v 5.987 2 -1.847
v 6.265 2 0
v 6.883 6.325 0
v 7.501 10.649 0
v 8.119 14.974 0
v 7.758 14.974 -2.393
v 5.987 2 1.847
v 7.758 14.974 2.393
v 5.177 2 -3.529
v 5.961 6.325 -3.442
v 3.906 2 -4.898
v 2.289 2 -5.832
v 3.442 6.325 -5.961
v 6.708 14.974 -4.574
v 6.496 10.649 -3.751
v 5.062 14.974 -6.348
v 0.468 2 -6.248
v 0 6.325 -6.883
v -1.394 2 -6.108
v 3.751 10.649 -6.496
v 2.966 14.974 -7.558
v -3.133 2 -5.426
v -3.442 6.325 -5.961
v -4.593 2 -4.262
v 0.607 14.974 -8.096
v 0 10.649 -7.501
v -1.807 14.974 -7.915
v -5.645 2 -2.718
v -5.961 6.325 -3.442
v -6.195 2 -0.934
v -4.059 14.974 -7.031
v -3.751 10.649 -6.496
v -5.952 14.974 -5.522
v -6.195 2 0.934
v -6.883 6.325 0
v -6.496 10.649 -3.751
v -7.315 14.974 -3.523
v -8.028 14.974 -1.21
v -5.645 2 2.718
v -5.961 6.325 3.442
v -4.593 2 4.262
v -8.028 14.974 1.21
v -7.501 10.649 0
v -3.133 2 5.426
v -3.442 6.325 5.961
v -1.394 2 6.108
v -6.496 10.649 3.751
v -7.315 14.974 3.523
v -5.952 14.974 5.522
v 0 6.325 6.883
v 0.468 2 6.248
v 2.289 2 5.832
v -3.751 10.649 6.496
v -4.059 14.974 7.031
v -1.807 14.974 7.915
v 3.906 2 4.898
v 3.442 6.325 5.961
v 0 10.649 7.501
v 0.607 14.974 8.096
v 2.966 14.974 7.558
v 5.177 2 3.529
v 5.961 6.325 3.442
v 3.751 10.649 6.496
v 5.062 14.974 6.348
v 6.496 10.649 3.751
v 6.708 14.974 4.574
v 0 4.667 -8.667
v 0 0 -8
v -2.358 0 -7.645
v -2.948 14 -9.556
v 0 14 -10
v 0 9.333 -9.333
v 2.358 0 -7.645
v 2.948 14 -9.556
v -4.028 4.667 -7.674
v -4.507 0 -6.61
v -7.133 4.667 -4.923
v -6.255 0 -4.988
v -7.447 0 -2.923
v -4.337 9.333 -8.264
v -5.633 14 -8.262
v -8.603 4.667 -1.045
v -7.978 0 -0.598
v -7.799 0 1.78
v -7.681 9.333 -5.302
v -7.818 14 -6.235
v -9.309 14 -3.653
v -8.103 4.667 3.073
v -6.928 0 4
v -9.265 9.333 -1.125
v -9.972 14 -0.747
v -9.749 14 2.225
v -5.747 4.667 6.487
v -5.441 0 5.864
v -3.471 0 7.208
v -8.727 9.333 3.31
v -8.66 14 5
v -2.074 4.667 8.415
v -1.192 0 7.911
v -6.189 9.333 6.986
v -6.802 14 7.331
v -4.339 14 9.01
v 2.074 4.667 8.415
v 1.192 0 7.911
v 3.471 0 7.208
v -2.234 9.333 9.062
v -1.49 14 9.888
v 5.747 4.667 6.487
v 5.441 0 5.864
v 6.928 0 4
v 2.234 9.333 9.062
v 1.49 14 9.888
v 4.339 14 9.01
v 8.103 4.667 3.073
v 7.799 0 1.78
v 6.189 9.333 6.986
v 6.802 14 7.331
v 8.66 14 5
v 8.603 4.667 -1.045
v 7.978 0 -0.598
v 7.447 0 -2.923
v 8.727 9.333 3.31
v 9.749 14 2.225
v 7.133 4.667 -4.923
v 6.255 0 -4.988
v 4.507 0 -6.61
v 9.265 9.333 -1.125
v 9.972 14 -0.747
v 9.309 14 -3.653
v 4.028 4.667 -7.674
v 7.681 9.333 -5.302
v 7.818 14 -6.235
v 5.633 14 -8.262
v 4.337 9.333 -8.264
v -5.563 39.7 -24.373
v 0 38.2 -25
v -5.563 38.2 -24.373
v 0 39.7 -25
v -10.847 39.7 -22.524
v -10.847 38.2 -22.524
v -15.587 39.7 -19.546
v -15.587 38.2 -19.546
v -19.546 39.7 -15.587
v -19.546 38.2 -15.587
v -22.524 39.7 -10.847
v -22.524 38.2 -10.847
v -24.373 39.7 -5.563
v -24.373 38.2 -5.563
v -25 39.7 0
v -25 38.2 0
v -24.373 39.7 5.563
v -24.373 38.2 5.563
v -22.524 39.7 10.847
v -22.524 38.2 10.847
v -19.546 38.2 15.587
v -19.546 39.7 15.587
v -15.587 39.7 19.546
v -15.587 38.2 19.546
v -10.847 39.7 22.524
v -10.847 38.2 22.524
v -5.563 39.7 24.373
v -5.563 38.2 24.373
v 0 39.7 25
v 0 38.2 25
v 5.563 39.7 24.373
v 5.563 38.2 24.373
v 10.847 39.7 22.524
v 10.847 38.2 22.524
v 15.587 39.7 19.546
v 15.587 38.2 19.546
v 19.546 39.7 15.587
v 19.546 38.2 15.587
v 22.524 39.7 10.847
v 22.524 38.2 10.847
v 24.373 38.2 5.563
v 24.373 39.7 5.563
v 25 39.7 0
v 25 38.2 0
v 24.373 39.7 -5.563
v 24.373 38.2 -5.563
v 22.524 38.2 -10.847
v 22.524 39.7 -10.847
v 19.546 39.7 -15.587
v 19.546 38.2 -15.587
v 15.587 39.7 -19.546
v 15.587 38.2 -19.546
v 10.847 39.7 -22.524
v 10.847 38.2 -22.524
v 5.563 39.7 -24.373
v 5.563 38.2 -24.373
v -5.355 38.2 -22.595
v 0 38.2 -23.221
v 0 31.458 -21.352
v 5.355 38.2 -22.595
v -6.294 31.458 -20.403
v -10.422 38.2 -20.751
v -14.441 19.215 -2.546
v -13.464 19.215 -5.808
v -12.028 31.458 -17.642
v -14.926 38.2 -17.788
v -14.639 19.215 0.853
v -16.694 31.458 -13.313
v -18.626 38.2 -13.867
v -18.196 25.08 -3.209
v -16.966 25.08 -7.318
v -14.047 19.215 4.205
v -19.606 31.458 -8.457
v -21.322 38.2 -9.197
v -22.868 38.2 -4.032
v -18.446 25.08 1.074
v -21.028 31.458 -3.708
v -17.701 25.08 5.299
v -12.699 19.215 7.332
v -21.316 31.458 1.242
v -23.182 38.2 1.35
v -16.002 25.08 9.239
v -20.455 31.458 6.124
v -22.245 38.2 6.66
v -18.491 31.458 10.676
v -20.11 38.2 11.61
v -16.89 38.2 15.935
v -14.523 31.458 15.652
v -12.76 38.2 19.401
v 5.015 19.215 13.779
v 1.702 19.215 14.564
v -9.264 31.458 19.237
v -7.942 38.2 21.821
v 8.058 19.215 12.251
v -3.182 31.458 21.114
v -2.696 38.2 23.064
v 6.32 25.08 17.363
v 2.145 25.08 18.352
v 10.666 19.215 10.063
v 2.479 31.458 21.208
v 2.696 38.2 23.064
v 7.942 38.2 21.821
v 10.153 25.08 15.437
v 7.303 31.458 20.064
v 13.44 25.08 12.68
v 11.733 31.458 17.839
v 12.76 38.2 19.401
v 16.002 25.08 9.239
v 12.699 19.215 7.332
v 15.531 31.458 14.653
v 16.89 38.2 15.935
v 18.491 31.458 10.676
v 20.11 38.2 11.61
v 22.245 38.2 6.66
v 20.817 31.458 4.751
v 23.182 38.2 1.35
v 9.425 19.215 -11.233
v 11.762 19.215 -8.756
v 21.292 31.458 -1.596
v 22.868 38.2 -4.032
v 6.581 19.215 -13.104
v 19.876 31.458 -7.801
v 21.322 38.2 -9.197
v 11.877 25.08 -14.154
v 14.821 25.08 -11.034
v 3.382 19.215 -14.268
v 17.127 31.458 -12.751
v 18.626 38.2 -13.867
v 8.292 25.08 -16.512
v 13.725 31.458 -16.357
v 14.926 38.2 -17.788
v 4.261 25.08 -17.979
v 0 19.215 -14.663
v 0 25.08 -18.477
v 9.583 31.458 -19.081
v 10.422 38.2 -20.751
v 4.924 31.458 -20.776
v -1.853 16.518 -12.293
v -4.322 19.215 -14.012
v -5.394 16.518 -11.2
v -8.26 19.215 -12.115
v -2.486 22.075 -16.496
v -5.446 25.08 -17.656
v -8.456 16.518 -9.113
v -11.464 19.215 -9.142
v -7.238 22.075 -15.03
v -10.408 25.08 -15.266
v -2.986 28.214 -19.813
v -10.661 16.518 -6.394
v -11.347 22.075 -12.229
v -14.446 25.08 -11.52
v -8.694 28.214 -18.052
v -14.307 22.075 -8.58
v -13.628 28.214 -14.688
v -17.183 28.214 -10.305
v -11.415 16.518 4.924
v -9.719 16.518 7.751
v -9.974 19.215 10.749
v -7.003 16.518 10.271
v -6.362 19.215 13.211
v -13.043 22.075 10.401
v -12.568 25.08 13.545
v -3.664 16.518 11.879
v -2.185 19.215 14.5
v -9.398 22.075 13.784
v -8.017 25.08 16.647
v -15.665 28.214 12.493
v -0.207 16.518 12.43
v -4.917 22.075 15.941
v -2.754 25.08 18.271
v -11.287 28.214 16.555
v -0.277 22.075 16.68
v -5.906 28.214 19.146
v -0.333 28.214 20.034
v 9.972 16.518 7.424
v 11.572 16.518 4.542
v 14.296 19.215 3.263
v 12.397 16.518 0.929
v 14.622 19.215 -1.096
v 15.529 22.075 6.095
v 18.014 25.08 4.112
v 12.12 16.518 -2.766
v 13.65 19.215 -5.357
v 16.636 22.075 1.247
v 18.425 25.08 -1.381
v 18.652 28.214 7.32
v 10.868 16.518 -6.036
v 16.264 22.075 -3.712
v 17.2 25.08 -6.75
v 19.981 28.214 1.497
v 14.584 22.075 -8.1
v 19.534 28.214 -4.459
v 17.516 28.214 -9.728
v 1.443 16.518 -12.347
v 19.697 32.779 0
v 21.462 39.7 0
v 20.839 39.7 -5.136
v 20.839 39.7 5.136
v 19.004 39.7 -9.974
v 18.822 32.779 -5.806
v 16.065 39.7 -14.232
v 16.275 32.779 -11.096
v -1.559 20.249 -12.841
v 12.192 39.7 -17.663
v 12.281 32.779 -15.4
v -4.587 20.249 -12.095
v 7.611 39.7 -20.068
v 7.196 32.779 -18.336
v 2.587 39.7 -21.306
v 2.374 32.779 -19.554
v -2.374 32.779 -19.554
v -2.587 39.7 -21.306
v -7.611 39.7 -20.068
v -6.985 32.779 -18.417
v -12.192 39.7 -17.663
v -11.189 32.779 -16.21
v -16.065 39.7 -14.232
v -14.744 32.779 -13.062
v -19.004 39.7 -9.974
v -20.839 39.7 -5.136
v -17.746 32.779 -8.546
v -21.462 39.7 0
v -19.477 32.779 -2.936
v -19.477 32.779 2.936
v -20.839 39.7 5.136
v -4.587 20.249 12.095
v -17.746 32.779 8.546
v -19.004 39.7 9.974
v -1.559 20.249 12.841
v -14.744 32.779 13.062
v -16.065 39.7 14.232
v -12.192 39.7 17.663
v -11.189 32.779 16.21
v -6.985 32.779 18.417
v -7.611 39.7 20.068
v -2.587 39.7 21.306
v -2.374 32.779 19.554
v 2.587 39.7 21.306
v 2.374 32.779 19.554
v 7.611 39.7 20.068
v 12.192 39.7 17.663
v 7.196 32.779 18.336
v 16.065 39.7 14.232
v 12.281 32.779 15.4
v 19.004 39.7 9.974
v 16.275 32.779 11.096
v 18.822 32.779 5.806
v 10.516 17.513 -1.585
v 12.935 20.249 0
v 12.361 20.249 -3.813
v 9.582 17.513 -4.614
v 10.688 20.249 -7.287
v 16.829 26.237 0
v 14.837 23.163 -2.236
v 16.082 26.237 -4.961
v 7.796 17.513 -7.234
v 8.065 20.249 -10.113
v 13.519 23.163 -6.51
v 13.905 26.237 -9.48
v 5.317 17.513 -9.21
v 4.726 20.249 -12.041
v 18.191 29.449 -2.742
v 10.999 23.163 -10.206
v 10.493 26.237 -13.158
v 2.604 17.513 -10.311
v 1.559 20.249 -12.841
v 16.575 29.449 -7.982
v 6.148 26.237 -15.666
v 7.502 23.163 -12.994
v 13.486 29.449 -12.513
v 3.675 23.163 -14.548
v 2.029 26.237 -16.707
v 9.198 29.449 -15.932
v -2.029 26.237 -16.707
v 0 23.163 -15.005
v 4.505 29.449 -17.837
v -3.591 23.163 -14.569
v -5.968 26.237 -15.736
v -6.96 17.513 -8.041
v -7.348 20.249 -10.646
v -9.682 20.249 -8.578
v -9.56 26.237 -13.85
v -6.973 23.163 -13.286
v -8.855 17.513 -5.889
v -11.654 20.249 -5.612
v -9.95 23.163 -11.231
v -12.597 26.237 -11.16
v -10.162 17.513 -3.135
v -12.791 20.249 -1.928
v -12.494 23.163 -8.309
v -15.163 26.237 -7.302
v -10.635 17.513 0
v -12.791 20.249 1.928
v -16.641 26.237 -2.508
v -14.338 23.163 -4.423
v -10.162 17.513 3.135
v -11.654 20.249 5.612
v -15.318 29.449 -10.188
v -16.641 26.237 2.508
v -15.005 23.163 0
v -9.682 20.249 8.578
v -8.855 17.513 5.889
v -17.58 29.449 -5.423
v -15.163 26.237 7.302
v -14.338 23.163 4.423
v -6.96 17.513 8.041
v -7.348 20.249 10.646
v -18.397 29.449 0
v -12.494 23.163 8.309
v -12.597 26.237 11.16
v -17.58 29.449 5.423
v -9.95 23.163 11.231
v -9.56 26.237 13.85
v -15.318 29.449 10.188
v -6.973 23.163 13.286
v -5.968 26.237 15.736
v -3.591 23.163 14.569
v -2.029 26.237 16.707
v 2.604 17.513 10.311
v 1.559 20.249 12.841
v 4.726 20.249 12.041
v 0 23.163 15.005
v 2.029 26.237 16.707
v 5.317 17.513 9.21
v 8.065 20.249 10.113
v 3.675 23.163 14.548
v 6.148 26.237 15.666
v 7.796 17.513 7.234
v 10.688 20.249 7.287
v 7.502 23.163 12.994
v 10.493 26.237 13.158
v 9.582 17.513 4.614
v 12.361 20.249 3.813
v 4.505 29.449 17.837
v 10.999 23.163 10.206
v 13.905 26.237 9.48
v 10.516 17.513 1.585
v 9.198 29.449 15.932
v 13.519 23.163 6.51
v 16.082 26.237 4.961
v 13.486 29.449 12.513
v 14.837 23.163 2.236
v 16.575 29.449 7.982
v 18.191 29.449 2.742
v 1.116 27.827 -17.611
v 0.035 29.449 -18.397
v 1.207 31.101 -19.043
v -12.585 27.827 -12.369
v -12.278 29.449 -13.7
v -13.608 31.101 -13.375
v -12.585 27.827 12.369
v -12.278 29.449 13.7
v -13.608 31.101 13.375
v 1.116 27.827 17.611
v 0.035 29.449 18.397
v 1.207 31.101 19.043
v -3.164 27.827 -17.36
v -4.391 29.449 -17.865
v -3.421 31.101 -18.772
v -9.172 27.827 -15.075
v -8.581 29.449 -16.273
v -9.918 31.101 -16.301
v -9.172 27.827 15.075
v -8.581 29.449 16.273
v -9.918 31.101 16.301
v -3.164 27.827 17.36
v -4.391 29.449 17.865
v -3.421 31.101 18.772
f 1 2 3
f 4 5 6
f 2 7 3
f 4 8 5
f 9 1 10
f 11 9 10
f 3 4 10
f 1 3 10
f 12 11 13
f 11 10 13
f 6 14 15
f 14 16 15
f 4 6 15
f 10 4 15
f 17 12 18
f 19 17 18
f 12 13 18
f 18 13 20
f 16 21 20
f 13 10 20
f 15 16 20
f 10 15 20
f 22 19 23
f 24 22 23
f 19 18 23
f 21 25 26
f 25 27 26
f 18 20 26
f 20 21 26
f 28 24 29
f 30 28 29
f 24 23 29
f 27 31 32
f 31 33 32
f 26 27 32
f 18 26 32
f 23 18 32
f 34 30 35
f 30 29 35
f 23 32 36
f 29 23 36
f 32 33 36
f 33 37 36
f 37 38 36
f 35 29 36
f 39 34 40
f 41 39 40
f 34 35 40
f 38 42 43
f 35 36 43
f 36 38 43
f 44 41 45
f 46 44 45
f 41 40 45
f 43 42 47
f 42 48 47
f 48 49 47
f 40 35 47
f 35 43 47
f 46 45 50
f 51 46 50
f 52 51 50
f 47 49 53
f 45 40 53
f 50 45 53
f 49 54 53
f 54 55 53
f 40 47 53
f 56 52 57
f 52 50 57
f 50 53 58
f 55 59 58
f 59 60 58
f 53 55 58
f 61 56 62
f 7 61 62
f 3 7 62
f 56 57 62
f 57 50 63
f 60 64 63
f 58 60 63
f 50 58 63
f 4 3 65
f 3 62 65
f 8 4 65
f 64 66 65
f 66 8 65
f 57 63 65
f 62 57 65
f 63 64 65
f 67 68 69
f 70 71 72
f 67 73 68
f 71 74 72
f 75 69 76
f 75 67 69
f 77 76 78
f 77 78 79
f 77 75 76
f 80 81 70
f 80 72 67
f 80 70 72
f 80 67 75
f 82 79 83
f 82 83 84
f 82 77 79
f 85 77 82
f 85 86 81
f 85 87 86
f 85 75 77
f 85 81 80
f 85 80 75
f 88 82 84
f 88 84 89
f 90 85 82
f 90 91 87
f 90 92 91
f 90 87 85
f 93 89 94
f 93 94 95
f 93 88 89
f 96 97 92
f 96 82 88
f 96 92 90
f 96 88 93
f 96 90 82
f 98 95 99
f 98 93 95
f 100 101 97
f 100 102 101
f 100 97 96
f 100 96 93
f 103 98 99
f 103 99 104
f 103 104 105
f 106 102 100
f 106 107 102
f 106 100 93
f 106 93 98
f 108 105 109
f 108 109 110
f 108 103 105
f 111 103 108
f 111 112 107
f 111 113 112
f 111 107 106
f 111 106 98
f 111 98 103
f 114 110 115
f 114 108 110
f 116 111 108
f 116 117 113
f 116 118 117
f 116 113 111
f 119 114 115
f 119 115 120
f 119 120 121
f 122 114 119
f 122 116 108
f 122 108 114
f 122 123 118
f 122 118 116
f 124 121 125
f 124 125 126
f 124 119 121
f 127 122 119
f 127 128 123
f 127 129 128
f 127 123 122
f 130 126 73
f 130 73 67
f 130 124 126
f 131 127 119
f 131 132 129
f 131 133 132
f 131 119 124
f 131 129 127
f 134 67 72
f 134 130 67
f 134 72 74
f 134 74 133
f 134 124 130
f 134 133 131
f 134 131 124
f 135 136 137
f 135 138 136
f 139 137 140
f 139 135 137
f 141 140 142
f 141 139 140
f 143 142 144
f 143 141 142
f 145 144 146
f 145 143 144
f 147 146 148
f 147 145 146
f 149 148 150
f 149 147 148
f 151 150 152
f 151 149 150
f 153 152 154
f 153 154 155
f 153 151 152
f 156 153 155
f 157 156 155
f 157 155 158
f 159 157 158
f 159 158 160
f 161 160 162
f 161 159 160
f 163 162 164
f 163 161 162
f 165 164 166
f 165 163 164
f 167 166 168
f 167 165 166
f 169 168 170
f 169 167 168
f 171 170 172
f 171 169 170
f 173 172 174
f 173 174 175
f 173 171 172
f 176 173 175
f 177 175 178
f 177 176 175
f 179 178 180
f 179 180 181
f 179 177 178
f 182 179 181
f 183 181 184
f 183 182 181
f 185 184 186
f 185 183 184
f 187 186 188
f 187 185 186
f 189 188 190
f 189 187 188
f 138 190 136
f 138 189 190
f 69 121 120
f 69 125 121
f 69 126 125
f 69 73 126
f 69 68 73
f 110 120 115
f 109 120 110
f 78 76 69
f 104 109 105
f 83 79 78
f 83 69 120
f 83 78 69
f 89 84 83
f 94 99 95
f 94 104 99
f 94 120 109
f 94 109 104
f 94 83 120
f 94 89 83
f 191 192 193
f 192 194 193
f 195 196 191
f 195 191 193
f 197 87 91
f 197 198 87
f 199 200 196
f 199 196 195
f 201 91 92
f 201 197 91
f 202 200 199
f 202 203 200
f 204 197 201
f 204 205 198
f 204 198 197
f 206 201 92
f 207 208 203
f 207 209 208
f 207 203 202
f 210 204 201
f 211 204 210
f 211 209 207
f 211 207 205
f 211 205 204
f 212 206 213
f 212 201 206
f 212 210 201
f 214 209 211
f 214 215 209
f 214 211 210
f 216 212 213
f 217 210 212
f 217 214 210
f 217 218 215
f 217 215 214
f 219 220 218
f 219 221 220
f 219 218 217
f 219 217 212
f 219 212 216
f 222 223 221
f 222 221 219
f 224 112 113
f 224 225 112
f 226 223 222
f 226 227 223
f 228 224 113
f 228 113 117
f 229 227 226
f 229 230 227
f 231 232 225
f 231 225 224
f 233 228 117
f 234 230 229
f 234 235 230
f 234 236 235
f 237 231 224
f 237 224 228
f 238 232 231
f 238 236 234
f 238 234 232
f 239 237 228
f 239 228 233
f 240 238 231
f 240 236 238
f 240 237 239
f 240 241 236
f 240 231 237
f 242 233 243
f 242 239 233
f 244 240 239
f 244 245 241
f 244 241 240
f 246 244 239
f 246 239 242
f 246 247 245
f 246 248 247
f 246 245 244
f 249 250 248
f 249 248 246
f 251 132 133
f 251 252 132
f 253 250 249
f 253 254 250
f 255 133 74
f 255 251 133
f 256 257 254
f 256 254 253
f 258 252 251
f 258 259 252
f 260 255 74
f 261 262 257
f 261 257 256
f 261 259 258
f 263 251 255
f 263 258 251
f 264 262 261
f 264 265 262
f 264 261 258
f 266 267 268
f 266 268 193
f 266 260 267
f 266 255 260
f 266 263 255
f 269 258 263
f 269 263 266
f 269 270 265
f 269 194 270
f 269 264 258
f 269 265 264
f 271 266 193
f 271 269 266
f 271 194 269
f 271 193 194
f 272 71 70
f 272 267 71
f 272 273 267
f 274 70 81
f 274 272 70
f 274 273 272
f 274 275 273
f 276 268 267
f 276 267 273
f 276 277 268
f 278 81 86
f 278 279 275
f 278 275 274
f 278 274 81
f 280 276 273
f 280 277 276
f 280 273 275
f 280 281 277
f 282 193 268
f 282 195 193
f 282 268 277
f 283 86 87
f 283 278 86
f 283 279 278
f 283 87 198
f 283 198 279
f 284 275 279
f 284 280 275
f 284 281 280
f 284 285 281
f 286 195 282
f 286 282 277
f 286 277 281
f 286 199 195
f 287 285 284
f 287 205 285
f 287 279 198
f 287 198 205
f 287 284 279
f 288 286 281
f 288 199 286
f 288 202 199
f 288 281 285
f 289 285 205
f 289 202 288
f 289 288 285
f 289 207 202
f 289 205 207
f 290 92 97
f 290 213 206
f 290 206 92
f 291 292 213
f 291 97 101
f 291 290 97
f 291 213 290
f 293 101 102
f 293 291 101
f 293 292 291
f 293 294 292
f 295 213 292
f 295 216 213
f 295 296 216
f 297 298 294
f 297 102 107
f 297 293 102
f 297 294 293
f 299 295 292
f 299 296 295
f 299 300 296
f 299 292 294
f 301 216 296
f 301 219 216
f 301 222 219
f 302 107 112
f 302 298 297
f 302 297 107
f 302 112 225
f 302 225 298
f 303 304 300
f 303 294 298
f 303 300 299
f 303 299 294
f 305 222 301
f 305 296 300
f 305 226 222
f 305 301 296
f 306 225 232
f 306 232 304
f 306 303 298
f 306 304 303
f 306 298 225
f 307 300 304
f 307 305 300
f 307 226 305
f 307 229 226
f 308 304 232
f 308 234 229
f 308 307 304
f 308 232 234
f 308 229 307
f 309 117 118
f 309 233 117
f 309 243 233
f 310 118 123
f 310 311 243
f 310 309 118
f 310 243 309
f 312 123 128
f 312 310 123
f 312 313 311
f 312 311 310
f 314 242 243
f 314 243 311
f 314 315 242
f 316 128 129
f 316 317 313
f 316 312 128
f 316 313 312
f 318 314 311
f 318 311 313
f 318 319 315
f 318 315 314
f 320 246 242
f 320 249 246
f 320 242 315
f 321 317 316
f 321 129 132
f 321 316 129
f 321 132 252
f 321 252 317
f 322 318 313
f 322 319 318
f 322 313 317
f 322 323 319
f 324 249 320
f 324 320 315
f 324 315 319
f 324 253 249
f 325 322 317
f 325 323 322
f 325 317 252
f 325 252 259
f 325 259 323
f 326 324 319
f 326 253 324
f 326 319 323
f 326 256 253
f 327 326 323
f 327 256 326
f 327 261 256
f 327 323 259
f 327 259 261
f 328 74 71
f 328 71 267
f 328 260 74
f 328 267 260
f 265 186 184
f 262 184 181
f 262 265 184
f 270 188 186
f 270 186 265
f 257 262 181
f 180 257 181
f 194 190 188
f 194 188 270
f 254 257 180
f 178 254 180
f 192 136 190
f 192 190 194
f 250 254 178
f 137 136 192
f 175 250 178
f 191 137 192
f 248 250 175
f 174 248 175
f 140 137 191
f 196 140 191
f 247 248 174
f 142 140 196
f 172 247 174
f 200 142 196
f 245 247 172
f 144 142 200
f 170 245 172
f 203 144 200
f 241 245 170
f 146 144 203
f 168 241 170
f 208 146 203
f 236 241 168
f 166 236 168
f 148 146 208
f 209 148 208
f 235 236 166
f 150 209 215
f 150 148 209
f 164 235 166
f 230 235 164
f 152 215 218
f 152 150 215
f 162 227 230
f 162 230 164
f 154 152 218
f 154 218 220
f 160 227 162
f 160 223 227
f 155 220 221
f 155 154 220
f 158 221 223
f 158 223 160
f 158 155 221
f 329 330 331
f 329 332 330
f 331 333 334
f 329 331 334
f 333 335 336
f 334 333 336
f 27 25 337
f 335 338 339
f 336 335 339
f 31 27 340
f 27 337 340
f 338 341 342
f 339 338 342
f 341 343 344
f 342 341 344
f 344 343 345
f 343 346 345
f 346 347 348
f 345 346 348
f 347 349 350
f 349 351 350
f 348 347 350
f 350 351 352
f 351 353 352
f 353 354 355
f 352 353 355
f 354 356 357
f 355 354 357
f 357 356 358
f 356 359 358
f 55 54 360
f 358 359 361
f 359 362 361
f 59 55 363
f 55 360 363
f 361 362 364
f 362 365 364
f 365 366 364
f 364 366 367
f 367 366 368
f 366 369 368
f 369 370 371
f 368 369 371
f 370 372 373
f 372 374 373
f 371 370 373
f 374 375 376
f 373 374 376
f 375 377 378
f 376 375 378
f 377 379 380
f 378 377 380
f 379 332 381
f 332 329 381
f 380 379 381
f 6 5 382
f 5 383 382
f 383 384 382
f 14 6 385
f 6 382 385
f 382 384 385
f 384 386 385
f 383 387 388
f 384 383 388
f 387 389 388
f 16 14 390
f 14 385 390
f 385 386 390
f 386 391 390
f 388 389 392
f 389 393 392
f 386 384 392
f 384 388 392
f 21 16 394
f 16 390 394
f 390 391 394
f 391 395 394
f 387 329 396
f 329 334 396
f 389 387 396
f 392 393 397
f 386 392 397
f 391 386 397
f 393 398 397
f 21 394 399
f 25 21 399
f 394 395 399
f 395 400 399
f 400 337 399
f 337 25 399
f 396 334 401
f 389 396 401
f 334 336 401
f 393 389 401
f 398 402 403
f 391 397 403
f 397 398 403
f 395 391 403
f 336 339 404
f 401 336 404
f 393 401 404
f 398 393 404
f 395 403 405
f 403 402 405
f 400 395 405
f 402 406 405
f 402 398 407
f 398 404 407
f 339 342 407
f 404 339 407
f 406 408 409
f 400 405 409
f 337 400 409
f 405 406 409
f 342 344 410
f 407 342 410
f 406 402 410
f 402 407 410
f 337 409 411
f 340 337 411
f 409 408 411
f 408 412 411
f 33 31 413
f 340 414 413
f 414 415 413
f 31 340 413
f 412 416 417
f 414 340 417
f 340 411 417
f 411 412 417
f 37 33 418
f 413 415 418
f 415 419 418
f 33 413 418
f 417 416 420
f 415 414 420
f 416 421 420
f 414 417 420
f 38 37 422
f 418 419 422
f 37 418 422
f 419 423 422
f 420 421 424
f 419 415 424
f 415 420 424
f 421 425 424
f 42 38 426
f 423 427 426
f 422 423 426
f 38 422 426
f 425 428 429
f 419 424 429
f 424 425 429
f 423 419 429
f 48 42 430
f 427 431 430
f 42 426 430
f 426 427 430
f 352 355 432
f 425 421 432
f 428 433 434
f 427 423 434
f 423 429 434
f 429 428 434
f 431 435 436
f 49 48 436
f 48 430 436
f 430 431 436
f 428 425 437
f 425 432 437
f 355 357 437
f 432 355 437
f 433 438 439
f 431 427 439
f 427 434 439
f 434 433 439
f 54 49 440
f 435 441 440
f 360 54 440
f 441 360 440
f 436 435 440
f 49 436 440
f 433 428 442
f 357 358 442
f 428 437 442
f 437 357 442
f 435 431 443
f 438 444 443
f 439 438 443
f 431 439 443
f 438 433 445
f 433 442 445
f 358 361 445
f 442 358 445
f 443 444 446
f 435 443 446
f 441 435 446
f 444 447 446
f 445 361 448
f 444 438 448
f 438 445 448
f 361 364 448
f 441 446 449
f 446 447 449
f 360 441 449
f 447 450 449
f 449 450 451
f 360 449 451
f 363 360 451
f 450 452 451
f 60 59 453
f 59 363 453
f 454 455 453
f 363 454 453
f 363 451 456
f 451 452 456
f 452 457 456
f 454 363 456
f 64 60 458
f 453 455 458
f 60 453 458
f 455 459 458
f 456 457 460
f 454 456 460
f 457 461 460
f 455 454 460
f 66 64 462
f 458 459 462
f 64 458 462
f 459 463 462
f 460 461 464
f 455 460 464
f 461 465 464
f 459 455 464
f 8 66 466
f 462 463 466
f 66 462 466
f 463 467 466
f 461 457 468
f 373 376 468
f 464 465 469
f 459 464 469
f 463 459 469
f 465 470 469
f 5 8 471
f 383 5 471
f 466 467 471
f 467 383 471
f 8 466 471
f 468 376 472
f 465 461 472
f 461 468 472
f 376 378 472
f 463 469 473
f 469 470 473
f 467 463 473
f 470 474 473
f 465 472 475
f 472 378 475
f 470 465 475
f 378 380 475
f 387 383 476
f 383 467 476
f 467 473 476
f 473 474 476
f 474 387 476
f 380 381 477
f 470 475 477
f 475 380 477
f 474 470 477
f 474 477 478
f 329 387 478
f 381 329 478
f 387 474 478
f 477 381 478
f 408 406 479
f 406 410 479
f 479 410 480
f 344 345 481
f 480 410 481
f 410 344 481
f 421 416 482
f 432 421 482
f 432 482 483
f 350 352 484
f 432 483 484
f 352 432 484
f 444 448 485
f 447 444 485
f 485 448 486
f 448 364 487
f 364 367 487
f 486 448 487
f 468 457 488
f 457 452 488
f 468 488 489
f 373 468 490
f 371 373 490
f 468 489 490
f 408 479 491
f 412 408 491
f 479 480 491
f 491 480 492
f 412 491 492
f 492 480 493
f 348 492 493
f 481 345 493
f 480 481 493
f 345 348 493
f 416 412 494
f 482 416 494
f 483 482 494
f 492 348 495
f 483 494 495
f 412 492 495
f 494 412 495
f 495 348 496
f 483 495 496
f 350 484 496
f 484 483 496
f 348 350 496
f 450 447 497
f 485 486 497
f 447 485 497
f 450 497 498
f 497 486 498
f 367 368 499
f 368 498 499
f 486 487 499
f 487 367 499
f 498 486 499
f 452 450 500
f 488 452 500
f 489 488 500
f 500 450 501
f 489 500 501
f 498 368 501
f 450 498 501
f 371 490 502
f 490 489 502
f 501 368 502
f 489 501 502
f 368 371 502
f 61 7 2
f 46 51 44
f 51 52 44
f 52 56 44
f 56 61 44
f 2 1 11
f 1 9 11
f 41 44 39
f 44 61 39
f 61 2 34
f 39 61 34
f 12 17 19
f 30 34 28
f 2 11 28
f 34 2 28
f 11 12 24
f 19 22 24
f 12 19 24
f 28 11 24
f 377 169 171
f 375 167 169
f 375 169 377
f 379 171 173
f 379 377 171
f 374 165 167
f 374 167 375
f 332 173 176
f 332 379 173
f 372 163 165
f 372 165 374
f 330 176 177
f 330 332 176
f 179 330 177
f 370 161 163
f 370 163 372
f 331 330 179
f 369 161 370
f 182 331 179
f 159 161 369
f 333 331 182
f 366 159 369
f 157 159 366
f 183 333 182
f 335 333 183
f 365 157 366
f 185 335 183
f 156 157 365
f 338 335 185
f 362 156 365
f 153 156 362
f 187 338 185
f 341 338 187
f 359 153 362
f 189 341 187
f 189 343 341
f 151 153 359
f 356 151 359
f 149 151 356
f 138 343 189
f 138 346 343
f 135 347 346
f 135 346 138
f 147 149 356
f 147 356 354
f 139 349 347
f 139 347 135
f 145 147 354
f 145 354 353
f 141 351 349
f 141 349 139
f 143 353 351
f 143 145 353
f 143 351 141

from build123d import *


# Read off the part's stored shape, not the designer's step: 抽壳1
with BuildPart() as part:
    # 草图3 → 旋转1 (revolve)
    with BuildSketch(Plane.XY, mode=Mode.PRIVATE) as revolve_1_sk:
        with BuildLine():
            Line((0, 0), (-8, 0))
            Line((-8, 0), (-10, 14))
            ThreePointArc((-10, 14), (-18.477025854, 25.080270137), (-23.220973783, 38.2))
            Line((-23.220973783, 38.2), (-25, 38.2))
            Line((-25, 38.2), (-25, 39.7))
            Line((-25, 39.7), (0, 39.7))
            Line((0, 39.7), (0, 0))
        make_face()
    revolve(revolve_1_sk.sketch.rotate(Axis((0, 0, 0), (0, 1, 0)), 270), axis=Axis((0, 0, 0), (0, 1, 0)))

    # 抽壳1 outline → 抽壳1 (revolve, cut)
    with BuildSketch(Plane.XY):
        with BuildLine():
            Line((6.265409197, 2), (8.118872407, 14.974242471))
            ThreePointArc((8.118872407, 14.974242471), (16.829276005, 26.23694427), (21.462386525, 39.7))
            Line((21.462386525, 39.7), (0, 39.7))
            Line((0, 39.7), (0, 2))
            Line((0, 2), (6.265409197, 2))
        make_face()
    revolve(axis=Axis((0, 0, 0), (0, 1, 0)), mode=Mode.SUBTRACT)


solid = part.part
